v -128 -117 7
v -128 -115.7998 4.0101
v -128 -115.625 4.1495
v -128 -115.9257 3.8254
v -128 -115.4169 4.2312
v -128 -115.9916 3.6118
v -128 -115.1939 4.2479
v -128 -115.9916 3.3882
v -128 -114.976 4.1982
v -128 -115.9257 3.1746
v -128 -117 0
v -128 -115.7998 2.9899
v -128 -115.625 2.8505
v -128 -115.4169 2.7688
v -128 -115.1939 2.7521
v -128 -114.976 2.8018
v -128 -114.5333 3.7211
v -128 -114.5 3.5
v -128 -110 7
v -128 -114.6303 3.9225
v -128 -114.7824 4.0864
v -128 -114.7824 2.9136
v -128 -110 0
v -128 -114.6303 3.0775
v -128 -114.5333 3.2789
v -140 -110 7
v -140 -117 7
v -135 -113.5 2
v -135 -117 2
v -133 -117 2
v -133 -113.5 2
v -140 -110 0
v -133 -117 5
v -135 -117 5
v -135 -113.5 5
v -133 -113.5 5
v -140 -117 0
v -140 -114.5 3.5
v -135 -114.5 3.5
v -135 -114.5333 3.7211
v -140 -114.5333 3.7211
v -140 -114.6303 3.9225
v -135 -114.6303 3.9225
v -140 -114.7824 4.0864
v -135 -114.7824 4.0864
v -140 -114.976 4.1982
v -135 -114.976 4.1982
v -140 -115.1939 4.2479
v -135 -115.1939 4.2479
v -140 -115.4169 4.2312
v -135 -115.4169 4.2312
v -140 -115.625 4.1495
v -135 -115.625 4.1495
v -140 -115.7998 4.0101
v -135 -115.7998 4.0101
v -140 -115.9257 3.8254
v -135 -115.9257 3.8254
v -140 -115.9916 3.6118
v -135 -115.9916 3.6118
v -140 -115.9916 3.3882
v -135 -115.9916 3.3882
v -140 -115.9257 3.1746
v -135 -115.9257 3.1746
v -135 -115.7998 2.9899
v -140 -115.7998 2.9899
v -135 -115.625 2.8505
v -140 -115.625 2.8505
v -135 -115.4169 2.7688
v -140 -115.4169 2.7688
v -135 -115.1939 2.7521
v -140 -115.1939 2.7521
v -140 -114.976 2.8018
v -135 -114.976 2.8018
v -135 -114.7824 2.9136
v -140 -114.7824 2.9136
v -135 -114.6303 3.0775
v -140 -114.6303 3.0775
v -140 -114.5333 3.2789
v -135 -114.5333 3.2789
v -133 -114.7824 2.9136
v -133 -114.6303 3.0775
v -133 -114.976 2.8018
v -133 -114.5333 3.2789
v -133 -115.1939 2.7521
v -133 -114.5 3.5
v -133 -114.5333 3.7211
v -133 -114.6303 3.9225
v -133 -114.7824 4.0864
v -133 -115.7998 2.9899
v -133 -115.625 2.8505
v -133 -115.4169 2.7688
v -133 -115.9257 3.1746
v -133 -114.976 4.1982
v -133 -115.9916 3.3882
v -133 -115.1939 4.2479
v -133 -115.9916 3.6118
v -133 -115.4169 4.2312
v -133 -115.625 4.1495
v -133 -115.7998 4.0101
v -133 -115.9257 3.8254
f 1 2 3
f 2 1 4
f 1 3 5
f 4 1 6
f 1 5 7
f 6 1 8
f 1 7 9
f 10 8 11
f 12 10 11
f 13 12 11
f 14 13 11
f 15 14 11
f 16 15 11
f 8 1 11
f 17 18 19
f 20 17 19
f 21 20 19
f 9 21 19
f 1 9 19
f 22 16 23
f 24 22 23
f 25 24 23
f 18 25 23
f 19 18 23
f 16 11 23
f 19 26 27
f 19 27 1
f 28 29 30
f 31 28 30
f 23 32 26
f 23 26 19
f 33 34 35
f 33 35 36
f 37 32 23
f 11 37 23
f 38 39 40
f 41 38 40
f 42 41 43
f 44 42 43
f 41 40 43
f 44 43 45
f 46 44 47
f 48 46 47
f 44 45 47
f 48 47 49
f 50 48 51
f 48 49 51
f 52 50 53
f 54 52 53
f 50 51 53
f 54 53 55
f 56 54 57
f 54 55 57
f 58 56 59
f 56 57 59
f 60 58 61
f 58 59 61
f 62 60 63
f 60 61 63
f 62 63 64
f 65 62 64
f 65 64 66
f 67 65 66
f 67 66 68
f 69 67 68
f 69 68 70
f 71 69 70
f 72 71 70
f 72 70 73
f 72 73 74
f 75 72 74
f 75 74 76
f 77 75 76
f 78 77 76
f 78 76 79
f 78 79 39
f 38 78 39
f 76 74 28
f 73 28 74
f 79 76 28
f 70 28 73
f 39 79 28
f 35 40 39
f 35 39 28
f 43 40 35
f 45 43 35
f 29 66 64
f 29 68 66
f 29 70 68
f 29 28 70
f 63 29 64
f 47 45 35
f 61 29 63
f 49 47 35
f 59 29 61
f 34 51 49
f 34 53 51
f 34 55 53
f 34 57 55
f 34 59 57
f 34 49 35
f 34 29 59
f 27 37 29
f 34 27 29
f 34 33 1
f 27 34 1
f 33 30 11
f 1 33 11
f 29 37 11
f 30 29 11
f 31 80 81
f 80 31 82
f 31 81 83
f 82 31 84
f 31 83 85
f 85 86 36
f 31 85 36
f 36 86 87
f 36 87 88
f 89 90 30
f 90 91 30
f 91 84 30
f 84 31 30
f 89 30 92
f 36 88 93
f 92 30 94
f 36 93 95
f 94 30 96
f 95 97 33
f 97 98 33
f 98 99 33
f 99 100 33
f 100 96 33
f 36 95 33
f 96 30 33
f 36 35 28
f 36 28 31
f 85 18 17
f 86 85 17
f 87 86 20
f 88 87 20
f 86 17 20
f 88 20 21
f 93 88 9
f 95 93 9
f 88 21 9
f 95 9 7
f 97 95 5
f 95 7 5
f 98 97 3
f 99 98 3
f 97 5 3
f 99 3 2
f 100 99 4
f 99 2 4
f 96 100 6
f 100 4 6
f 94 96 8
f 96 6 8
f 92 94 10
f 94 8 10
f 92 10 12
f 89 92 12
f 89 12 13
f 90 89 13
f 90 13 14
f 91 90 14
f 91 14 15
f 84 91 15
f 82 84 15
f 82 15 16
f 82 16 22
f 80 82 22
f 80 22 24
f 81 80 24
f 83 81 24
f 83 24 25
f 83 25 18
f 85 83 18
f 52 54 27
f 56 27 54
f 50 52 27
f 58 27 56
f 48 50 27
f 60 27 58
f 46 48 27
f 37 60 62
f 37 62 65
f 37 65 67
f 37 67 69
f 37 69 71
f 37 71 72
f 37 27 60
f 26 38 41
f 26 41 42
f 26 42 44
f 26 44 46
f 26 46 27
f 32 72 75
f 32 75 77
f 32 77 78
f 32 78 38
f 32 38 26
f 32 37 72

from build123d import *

# Parameters (mm, degrees)
SKETCH087_W      = 12
SKETCH087_H      = 7
EXTRUDE007_DEPTH = 7
SKETCH088_W      = 2
SKETCH088_H      = 3
POCKET018_DEPTH  = 3.5
SKETCH089_R      = 0.75
HOLE018_DEPTH    = 12
HOLE018_TIPS_R   = 0.75


with BuildPart() as part:
    # Sketch087 → Extrude007 (new body)
    with BuildSketch(Plane.XY):
        with Locations((-134, -113.5)):
            Rectangle(SKETCH087_W, SKETCH087_H)
    extrude(amount=EXTRUDE007_DEPTH)

    # Sketch088 (on Face3 of Extrude007) → Pocket018 (cut)
    with BuildSketch(Plane.XZ.offset(117)):
        with Locations((-134, 3.5)):
            Rectangle(SKETCH088_W, SKETCH088_H)
    extrude(amount=-POCKET018_DEPTH, mode=Mode.SUBTRACT)

    # Sketch089 (on Face3 of Pocket018) → Hole018 (cut)
    with BuildSketch(Plane.YZ.offset(-128)):
        with Locations((-115.249997, 3.5)):
            Circle(SKETCH089_R)
    extrude(amount=-HOLE018_DEPTH, mode=Mode.SUBTRACT)

    # Hole018 tips → Hole018 tip 1 section 0
    with BuildSketch(Plane.YZ.offset(-140), mode=Mode.PRIVATE) as hole018_tip_1_s0:
        with Locations((-115.249997, 3.5)):
            Circle(HOLE018_TIPS_R)
    loft([hole018_tip_1_s0.sketch, Vertex(-140.450645, -115.249997, 3.5)], mode=Mode.SUBTRACT)


solid = part.part
